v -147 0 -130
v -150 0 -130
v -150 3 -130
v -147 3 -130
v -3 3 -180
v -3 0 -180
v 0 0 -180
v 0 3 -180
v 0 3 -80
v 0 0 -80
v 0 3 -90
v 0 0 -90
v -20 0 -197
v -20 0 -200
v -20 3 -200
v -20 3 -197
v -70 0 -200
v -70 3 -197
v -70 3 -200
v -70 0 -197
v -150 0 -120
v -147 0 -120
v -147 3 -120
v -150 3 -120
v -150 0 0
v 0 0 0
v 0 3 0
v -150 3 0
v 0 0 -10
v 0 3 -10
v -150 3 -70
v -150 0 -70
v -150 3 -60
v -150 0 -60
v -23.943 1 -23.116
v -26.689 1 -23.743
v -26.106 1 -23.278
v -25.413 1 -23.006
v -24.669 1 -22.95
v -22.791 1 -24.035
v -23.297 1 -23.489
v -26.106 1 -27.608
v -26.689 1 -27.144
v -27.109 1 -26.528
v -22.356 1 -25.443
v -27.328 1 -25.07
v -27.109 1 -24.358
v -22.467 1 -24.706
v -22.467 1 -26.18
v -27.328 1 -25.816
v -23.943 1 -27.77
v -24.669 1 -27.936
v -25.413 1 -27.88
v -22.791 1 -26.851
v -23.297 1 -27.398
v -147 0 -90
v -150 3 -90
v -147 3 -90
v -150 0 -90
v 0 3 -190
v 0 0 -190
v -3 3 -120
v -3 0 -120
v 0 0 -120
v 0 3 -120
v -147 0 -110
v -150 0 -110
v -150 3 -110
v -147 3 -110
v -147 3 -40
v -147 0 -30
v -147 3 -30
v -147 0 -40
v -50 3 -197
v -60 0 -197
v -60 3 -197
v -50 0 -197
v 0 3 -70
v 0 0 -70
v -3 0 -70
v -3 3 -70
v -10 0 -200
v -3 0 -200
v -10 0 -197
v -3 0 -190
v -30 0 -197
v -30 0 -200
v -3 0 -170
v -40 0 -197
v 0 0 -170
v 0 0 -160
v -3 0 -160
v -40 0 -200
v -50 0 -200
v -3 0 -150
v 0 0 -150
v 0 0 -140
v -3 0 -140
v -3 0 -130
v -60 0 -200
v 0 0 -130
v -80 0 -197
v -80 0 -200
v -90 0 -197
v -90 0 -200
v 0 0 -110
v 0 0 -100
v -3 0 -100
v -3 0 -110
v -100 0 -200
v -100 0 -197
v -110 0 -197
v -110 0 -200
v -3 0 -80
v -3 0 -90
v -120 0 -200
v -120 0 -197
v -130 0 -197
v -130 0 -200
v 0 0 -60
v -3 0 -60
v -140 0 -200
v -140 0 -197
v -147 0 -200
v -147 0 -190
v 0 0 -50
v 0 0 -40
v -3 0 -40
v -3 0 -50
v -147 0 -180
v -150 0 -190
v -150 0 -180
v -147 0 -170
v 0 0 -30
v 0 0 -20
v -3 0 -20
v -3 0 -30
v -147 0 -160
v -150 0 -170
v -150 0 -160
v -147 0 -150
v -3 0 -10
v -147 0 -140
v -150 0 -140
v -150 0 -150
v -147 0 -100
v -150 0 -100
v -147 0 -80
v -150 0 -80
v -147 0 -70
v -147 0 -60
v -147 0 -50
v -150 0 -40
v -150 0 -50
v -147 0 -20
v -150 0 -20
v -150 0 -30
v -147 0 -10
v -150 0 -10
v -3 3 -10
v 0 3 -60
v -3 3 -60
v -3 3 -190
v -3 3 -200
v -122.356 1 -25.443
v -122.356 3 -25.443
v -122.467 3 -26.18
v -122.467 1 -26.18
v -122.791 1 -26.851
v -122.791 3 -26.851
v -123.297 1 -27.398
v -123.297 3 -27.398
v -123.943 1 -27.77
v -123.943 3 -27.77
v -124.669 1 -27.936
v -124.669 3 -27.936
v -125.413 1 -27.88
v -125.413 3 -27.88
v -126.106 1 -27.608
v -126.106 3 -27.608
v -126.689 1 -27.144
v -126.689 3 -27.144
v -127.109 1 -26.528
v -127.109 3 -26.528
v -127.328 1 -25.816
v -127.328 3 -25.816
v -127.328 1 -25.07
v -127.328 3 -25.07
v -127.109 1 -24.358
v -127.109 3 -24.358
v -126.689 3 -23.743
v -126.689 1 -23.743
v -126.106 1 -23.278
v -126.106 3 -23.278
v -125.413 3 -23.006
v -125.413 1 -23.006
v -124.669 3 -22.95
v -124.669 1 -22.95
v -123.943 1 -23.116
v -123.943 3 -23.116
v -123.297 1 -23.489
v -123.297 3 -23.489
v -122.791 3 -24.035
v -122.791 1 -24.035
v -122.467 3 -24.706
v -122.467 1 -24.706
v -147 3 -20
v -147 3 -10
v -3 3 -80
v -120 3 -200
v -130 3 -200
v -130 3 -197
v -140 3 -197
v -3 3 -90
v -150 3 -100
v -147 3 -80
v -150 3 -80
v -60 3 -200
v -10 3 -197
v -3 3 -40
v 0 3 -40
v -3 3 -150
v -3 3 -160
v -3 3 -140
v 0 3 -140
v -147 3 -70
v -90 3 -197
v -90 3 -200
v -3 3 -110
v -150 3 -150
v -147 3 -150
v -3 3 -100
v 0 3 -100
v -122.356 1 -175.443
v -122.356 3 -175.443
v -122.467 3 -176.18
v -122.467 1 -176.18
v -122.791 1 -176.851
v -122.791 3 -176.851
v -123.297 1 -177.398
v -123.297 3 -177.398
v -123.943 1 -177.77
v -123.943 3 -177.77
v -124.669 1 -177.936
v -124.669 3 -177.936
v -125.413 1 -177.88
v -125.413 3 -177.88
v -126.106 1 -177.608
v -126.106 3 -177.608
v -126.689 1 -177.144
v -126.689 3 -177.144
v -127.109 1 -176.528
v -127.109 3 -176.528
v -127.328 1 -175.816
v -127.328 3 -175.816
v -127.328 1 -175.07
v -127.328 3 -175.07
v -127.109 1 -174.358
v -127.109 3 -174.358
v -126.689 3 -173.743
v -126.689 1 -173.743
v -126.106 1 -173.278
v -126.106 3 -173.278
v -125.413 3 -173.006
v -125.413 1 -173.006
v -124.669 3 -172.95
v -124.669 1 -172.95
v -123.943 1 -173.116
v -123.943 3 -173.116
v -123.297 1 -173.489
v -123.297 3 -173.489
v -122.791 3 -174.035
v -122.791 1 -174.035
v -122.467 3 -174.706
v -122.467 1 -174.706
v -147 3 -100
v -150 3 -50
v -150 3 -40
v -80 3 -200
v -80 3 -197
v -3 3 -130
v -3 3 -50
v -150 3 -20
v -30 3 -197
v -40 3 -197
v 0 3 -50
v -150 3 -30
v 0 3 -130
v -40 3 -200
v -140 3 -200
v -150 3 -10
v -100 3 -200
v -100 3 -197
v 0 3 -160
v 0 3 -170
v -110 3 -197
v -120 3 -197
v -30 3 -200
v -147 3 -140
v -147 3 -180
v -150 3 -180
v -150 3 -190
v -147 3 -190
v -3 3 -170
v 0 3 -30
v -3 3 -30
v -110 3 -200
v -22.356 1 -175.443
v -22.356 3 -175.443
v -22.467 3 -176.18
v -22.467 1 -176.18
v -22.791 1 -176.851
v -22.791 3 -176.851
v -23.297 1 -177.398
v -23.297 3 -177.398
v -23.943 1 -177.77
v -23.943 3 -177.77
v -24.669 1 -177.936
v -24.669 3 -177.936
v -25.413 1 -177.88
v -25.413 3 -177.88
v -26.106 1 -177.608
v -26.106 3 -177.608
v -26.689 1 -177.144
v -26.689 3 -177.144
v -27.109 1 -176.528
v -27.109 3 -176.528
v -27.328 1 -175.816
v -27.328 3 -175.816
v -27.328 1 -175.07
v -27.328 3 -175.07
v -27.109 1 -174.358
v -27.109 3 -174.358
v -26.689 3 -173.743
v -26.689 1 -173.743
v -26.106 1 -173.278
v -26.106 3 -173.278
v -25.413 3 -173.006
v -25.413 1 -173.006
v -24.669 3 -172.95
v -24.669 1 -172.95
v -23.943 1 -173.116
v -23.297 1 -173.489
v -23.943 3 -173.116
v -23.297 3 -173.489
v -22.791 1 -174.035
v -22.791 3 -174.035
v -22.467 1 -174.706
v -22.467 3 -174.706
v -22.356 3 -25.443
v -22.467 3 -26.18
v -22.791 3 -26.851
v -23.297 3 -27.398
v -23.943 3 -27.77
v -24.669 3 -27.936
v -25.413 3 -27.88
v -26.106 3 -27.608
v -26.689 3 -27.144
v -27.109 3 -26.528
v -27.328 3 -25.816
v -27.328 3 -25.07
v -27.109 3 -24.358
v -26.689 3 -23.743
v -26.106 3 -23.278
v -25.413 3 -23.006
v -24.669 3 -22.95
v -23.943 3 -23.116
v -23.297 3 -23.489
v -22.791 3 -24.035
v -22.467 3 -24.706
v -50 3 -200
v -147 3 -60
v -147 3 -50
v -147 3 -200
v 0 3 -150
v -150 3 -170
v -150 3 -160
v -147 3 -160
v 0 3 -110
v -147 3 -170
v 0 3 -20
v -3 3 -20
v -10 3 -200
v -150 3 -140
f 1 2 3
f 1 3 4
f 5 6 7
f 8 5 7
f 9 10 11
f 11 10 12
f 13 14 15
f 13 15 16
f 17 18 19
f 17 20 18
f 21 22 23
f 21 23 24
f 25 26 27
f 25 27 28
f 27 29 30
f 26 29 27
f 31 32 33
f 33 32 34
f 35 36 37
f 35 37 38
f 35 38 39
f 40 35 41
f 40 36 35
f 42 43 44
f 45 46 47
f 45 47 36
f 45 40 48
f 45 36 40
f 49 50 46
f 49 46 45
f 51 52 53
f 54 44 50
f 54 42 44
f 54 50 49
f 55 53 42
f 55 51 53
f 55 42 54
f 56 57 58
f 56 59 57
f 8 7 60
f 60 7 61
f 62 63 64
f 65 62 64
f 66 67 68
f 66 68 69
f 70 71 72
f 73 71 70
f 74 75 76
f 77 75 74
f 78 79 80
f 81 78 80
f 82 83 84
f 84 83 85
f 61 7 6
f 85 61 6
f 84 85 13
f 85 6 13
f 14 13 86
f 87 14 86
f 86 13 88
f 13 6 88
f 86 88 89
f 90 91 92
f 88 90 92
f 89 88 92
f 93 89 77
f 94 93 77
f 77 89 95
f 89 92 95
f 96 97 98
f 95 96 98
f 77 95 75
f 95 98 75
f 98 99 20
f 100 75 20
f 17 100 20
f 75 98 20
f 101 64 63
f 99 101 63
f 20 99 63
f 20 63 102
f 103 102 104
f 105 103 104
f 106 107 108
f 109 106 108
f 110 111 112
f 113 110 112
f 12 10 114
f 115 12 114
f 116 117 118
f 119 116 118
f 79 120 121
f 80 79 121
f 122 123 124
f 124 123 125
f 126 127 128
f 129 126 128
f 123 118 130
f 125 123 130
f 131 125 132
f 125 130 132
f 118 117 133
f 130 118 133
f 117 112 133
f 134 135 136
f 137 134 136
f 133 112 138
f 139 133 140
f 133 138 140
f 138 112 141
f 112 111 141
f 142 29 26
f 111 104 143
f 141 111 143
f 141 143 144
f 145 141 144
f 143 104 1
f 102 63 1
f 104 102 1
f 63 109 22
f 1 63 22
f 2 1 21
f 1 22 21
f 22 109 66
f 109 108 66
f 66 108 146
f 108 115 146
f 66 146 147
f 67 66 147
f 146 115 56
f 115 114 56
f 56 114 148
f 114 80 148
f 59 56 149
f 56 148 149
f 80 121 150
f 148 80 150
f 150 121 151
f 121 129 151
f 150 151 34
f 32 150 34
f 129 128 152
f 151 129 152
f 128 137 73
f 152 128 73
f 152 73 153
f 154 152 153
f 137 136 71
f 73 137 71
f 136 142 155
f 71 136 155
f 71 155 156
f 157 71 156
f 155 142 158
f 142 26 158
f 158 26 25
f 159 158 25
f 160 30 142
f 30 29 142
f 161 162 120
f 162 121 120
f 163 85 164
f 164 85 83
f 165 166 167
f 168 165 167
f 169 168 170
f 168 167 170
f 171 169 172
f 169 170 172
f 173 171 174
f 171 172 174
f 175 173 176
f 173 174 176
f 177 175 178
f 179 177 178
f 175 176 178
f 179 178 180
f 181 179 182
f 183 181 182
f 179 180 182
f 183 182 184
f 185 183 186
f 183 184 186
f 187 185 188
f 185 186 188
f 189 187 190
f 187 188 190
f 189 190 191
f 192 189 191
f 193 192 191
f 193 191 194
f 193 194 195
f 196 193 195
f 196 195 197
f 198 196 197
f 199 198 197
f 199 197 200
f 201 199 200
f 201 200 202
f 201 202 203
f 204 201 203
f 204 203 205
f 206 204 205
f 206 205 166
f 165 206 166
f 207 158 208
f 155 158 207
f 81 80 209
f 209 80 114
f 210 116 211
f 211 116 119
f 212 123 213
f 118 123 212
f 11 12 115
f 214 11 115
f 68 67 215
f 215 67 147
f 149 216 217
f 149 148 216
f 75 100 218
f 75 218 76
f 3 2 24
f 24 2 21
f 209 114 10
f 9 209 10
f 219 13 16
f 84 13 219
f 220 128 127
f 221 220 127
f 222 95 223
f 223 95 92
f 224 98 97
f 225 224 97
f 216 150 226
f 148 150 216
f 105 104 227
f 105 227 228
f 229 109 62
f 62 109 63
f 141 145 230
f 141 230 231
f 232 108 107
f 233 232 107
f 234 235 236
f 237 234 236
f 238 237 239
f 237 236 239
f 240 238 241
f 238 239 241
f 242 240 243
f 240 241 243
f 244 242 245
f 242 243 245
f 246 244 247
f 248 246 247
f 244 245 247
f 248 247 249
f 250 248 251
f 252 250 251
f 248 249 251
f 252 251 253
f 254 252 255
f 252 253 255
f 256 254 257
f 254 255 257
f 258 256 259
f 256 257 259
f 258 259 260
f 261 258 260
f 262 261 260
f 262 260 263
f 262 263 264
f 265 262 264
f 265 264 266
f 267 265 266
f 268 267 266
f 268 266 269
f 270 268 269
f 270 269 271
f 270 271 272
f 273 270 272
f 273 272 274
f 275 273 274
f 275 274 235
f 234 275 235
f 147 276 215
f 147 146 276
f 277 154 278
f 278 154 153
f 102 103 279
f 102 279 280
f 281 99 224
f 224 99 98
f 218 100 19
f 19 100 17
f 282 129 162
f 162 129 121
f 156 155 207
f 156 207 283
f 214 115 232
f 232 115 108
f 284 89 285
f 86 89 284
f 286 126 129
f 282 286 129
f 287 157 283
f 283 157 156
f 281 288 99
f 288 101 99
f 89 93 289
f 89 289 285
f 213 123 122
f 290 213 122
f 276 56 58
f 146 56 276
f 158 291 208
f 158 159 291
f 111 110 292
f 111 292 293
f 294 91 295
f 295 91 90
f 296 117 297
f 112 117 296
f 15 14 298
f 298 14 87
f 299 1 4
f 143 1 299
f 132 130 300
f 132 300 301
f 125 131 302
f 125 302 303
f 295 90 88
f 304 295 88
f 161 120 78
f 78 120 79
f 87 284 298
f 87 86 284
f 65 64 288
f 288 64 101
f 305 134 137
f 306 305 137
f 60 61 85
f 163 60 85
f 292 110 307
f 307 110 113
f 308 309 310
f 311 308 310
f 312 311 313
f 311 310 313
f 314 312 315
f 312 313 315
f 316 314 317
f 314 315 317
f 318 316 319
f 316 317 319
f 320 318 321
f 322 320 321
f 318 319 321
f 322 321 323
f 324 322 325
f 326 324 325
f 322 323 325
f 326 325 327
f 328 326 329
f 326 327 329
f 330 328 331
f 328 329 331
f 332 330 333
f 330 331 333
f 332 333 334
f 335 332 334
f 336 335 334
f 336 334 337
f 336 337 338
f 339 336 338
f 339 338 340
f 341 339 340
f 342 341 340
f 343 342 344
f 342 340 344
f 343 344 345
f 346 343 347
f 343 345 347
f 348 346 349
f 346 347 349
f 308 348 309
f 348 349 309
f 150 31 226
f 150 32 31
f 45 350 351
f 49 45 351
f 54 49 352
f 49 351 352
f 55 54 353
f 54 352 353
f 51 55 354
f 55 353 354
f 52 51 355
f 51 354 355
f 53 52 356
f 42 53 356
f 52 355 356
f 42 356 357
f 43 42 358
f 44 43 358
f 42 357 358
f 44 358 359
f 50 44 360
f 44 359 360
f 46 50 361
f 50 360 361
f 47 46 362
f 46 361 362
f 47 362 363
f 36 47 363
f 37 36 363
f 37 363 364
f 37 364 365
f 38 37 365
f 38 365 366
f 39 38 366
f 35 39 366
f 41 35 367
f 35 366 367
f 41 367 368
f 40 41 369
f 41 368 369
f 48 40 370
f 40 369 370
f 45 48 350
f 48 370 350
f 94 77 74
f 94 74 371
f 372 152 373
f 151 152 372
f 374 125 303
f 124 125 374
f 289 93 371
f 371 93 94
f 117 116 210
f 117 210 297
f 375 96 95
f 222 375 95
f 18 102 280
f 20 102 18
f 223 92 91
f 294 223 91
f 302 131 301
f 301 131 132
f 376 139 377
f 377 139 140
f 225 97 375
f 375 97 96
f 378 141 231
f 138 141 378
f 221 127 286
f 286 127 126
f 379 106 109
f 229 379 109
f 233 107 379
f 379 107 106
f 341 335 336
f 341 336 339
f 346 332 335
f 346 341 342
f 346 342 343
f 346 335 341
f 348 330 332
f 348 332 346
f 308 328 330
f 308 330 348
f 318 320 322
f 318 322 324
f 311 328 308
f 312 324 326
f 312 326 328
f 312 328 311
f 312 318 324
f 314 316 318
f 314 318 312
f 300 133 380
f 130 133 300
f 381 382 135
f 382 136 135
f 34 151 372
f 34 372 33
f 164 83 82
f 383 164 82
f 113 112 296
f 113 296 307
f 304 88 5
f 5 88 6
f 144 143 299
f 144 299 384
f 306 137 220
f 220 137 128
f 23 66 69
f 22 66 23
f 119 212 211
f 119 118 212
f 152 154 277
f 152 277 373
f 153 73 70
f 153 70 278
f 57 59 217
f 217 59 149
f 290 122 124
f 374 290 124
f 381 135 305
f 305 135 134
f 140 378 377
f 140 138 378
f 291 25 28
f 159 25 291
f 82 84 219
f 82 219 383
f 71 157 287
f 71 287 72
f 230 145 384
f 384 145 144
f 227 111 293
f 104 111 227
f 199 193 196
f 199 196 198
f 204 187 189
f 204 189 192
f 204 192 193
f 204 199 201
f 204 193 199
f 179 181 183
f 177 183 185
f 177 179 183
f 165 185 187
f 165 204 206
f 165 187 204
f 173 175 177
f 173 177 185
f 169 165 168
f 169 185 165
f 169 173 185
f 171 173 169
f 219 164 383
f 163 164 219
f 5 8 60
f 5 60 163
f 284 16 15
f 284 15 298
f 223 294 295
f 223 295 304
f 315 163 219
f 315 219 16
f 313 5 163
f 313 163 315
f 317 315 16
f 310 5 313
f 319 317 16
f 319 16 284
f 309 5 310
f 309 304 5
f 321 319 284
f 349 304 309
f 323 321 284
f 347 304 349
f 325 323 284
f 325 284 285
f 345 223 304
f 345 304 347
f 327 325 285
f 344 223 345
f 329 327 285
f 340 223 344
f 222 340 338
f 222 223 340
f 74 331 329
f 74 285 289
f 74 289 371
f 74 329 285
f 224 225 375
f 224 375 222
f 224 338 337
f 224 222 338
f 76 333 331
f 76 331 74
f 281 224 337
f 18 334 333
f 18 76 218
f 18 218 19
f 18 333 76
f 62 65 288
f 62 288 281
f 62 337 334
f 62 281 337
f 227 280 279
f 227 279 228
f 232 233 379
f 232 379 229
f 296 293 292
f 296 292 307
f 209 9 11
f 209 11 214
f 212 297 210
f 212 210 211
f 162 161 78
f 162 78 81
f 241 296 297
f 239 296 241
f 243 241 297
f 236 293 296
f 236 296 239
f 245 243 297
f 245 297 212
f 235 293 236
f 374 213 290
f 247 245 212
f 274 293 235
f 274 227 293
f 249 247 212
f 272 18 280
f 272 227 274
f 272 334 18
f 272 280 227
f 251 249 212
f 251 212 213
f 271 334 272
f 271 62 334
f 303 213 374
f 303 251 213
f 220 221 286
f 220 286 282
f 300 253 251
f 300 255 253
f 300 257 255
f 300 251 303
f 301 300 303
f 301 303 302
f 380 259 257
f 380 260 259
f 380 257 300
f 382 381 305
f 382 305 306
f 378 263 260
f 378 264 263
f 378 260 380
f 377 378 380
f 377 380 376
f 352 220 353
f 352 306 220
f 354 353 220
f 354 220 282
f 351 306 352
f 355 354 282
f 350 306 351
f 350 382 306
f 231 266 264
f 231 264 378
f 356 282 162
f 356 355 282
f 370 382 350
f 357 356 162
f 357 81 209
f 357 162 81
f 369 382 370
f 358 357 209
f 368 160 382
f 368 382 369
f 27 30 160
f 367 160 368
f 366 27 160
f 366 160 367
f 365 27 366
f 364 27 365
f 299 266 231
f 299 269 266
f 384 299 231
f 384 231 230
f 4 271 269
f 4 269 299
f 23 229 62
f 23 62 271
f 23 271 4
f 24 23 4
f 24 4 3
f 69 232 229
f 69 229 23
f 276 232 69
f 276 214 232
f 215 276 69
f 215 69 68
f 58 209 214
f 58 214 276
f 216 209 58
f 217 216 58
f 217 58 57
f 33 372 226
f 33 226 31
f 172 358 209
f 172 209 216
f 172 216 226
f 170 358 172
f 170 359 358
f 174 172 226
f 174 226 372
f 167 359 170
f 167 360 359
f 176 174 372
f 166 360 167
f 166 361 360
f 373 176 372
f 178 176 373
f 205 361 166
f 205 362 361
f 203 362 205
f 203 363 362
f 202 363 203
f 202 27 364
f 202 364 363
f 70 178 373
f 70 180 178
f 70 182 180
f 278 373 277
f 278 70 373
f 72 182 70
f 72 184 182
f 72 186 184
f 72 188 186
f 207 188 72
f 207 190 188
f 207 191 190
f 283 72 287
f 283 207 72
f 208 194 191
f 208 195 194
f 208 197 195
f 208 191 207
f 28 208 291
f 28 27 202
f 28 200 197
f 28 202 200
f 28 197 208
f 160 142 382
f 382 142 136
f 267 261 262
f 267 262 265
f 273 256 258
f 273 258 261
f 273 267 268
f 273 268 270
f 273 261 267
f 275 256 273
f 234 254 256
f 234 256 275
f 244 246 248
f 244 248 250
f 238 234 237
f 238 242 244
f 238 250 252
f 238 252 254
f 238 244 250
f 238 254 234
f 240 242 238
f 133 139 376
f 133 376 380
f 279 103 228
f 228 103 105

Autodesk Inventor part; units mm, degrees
ref_plane "YZ Plane" through (0, 0, 0) normal (1, 0, 0) x (0, 1, 0)
ref_plane "XZ Plane" through (0, 0, 0) normal (0, 1, 0) x (-1, 0, 0)
ref_plane "XY Plane" through (0, 0, 0) normal (0, 0, 1) x (1, 0, 0)
sketch "Sketch2" plane through (0, 0, 0) normal (0, 1, 0) x (-1, 0, 0)
  line L0 (0, 0) -> (150, 0)
  line L1 (150, 0) -> (150, -200)
  line L2 (150, -200) -> (0, -200)
  line L3 (0, -200) -> (0, 0)
  point P0 (75, -100)
  dimension "d4" = 150
  dimension "d5" = 200
extrude "Extrusion2" add sketch "Sketch2" along normal blind 3
sketch "Sketch3" plane through (0, 0, 0) normal (0, -1, 0) x (1, 0, 0)
  line L0 (-150, -200) -> (-150, 0) projected
  line L1 (-150, 0) -> (-150, -10)
  line L2 (-150, -10) -> (-147, -10)
  line L3 (-147, -10) -> (-147, -20)
  line L4 (-147, -20) -> (-150, -20)
  line L5 (-147, -30) -> (-147, -40)
  line L6 (-147, -40) -> (-150, -40)
  line L7 (-150, -30) -> (-147, -30)
  line L8 (-150, -20) -> (-150, -30)
  line L9 (-147, -50) -> (-147, -60)
  line L10 (-147, -60) -> (-150, -60)
  line L11 (-150, -50) -> (-147, -50)
  line L12 (-150, -40) -> (-150, -50)
  line L13 (-147, -70) -> (-147, -80)
  line L14 (-147, -80) -> (-150, -80)
  line L15 (-150, -70) -> (-147, -70)
  line L16 (-150, -60) -> (-150, -70)
  line L17 (-147, -90) -> (-147, -100)
  line L18 (-147, -100) -> (-150, -100)
  line L19 (-150, -90) -> (-147, -90)
  line L20 (-150, -80) -> (-150, -90)
  line L21 (-147, -110) -> (-147, -120)
  line L22 (-147, -120) -> (-150, -120)
  line L23 (-150, -110) -> (-147, -110)
  line L24 (-150, -100) -> (-150, -110)
  line L25 (-147, -130) -> (-147, -140)
  line L26 (-147, -140) -> (-150, -140)
  line L27 (-150, -130) -> (-147, -130)
  line L28 (-150, -120) -> (-150, -130)
  line L29 (-147, -150) -> (-147, -160)
  line L30 (-147, -160) -> (-150, -160)
  line L31 (-150, -150) -> (-147, -150)
  line L32 (-150, -140) -> (-150, -150)
  line L33 (-147, -170) -> (-147, -180)
  line L34 (-147, -180) -> (-150, -180)
  line L35 (-150, -170) -> (-147, -170)
  line L36 (-150, -160) -> (-150, -170)
  line L37 (-150, -180) -> (-150, -190)
  line L38 (-150, -190) -> (-147, -190)
  line L39 (0, 0) -> (0, -10)
  line L40 (0, 0) -> (0, -200) projected
  line L41 (-3, -10) -> (-3, -20)
  line L42 (-3, -20) -> (0, -20)
  line L43 (0, -20) -> (0, -30)
  line L44 (0, -30) -> (-3, -30)
  line L45 (-3, -30) -> (-3, -40)
  line L46 (-3, -40) -> (0, -40)
  line L47 (0, -40) -> (0, -50)
  line L48 (0, -50) -> (-3, -50)
  line L49 (-3, -50) -> (-3, -60)
  line L50 (-3, -60) -> (0, -60)
  line L51 (0, -60) -> (0, -70)
  line L52 (0, -70) -> (-3, -70)
  line L53 (-3, -70) -> (-3, -80)
  line L54 (-3, -80) -> (0, -80)
  line L55 (0, -80) -> (0, -90)
  line L56 (0, -90) -> (-3, -90)
  line L57 (-3, -90) -> (-3, -100)
  line L58 (-3, -100) -> (0, -100)
  line L59 (0, -100) -> (0, -110)
  line L60 (0, -110) -> (-3, -110)
  line L61 (-3, -110) -> (-3, -120)
  line L62 (-3, -120) -> (0, -120)
  line L63 (0, -120) -> (0, -130)
  line L64 (0, -130) -> (-3, -130)
  line L65 (-3, -130) -> (-3, -140)
  line L66 (-3, -140) -> (0, -140)
  line L67 (0, -140) -> (0, -150)
  line L68 (0, -150) -> (-3, -150)
  line L69 (-3, -150) -> (-3, -160)
  line L70 (-3, -160) -> (0, -160)
  line L71 (0, -160) -> (0, -170)
  line L72 (0, -170) -> (-3, -170)
  line L73 (-3, -170) -> (-3, -180)
  line L74 (-3, -180) -> (0, -180)
  line L75 (0, -180) -> (0, -190)
  line L76 (0, -190) -> (-3, -190)
  line L77 (-3, -190) -> (-3, -200)
  line L78 (0, -200) -> (-150, -200) projected
  line L79 (-147, -190) -> (-147, -200)
  line L80 (0, -10) -> (-3, -10)
  line L81 (-147, -200) -> (-140, -200)
  line L82 (-140, -197) -> (-130, -197)
  line L83 (-130, -197) -> (-130, -200)
  line L84 (-120, -200) -> (-120, -197)
  line L85 (-120, -197) -> (-110, -197)
  line L86 (-110, -197) -> (-110, -200)
  line L87 (-100, -200) -> (-100, -197)
  line L88 (-100, -197) -> (-90, -197)
  line L89 (-90, -197) -> (-90, -200)
  line L90 (-80, -200) -> (-80, -197)
  line L91 (-80, -197) -> (-70, -197)
  line L92 (-70, -197) -> (-70, -200)
  line L93 (-60, -200) -> (-60, -197)
  line L94 (-60, -197) -> (-50, -197)
  line L95 (-50, -197) -> (-50, -200)
  line L96 (-40, -200) -> (-40, -197)
  line L97 (-40, -197) -> (-30, -197)
  line L98 (-30, -197) -> (-30, -200)
  line L99 (-20, -200) -> (-20, -197)
  line L100 (-20, -197) -> (-10, -197)
  line L101 (-10, -197) -> (-10, -200)
  line L102 (-140, -197) -> (-140, -200)
  line L103 (-150, 0) -> (0, 0)
  point P0 (-10, 0)
  point P1 (-20, 0)
  dimension "d23" = 20
extrude "Extrusion3" cut sketch "Sketch3" against normal blind 3 contours L0 L34 L33 L35 L30 L29 L31 L26 L25 L27 L22 L21 L23 L18 L17 L19 L14 L13 L15 L10 L9 L11 L6 L5 L7 L4 L3 L2 L103 L39 L80 L41 L42 L40 L44 L45 L46 L48 L49 L50 L52 L53 L54 L56 L57 L58 L60 L61 L62 L64 L65 L66 L68 L69 L70 L72 L73 L74 L76 L77 L78 L101 L100 L99 L98 L97 L96 L95 L94 L93 L92 L91 L90 L89 L88 L87 L86 L85 L84 L83 L82 L102 L79 L38 keep common part
sketch "Sketch5" plane through (0, 3, 0) normal (0, 1, 0) x (1, 0, 0)
  line L0 (-150, 190) -> (-150, 0) projected
  circle A0 centre (-24.8562, 25.4431) radius 2.5
  circle A1 centre (-124.8562, 25.4431) radius 2.5
  circle A2 centre (-24.8562, 175.4431) radius 2.5
  circle A3 centre (-124.8562, 175.4431) radius 2.5
  point P0 (0, 0)
  point P1 (-150, 10)
  point P2 (0, 0)
  point P3 (-75, 100)
  dimension "d38" = 5
  dimension "d39" = 100
  dimension "d40" = 150
extrude "Extrusion4" cut sketch "Sketch5" against normal blind 2
properties part number "TableBottom" material "Wood (Cherry)"
